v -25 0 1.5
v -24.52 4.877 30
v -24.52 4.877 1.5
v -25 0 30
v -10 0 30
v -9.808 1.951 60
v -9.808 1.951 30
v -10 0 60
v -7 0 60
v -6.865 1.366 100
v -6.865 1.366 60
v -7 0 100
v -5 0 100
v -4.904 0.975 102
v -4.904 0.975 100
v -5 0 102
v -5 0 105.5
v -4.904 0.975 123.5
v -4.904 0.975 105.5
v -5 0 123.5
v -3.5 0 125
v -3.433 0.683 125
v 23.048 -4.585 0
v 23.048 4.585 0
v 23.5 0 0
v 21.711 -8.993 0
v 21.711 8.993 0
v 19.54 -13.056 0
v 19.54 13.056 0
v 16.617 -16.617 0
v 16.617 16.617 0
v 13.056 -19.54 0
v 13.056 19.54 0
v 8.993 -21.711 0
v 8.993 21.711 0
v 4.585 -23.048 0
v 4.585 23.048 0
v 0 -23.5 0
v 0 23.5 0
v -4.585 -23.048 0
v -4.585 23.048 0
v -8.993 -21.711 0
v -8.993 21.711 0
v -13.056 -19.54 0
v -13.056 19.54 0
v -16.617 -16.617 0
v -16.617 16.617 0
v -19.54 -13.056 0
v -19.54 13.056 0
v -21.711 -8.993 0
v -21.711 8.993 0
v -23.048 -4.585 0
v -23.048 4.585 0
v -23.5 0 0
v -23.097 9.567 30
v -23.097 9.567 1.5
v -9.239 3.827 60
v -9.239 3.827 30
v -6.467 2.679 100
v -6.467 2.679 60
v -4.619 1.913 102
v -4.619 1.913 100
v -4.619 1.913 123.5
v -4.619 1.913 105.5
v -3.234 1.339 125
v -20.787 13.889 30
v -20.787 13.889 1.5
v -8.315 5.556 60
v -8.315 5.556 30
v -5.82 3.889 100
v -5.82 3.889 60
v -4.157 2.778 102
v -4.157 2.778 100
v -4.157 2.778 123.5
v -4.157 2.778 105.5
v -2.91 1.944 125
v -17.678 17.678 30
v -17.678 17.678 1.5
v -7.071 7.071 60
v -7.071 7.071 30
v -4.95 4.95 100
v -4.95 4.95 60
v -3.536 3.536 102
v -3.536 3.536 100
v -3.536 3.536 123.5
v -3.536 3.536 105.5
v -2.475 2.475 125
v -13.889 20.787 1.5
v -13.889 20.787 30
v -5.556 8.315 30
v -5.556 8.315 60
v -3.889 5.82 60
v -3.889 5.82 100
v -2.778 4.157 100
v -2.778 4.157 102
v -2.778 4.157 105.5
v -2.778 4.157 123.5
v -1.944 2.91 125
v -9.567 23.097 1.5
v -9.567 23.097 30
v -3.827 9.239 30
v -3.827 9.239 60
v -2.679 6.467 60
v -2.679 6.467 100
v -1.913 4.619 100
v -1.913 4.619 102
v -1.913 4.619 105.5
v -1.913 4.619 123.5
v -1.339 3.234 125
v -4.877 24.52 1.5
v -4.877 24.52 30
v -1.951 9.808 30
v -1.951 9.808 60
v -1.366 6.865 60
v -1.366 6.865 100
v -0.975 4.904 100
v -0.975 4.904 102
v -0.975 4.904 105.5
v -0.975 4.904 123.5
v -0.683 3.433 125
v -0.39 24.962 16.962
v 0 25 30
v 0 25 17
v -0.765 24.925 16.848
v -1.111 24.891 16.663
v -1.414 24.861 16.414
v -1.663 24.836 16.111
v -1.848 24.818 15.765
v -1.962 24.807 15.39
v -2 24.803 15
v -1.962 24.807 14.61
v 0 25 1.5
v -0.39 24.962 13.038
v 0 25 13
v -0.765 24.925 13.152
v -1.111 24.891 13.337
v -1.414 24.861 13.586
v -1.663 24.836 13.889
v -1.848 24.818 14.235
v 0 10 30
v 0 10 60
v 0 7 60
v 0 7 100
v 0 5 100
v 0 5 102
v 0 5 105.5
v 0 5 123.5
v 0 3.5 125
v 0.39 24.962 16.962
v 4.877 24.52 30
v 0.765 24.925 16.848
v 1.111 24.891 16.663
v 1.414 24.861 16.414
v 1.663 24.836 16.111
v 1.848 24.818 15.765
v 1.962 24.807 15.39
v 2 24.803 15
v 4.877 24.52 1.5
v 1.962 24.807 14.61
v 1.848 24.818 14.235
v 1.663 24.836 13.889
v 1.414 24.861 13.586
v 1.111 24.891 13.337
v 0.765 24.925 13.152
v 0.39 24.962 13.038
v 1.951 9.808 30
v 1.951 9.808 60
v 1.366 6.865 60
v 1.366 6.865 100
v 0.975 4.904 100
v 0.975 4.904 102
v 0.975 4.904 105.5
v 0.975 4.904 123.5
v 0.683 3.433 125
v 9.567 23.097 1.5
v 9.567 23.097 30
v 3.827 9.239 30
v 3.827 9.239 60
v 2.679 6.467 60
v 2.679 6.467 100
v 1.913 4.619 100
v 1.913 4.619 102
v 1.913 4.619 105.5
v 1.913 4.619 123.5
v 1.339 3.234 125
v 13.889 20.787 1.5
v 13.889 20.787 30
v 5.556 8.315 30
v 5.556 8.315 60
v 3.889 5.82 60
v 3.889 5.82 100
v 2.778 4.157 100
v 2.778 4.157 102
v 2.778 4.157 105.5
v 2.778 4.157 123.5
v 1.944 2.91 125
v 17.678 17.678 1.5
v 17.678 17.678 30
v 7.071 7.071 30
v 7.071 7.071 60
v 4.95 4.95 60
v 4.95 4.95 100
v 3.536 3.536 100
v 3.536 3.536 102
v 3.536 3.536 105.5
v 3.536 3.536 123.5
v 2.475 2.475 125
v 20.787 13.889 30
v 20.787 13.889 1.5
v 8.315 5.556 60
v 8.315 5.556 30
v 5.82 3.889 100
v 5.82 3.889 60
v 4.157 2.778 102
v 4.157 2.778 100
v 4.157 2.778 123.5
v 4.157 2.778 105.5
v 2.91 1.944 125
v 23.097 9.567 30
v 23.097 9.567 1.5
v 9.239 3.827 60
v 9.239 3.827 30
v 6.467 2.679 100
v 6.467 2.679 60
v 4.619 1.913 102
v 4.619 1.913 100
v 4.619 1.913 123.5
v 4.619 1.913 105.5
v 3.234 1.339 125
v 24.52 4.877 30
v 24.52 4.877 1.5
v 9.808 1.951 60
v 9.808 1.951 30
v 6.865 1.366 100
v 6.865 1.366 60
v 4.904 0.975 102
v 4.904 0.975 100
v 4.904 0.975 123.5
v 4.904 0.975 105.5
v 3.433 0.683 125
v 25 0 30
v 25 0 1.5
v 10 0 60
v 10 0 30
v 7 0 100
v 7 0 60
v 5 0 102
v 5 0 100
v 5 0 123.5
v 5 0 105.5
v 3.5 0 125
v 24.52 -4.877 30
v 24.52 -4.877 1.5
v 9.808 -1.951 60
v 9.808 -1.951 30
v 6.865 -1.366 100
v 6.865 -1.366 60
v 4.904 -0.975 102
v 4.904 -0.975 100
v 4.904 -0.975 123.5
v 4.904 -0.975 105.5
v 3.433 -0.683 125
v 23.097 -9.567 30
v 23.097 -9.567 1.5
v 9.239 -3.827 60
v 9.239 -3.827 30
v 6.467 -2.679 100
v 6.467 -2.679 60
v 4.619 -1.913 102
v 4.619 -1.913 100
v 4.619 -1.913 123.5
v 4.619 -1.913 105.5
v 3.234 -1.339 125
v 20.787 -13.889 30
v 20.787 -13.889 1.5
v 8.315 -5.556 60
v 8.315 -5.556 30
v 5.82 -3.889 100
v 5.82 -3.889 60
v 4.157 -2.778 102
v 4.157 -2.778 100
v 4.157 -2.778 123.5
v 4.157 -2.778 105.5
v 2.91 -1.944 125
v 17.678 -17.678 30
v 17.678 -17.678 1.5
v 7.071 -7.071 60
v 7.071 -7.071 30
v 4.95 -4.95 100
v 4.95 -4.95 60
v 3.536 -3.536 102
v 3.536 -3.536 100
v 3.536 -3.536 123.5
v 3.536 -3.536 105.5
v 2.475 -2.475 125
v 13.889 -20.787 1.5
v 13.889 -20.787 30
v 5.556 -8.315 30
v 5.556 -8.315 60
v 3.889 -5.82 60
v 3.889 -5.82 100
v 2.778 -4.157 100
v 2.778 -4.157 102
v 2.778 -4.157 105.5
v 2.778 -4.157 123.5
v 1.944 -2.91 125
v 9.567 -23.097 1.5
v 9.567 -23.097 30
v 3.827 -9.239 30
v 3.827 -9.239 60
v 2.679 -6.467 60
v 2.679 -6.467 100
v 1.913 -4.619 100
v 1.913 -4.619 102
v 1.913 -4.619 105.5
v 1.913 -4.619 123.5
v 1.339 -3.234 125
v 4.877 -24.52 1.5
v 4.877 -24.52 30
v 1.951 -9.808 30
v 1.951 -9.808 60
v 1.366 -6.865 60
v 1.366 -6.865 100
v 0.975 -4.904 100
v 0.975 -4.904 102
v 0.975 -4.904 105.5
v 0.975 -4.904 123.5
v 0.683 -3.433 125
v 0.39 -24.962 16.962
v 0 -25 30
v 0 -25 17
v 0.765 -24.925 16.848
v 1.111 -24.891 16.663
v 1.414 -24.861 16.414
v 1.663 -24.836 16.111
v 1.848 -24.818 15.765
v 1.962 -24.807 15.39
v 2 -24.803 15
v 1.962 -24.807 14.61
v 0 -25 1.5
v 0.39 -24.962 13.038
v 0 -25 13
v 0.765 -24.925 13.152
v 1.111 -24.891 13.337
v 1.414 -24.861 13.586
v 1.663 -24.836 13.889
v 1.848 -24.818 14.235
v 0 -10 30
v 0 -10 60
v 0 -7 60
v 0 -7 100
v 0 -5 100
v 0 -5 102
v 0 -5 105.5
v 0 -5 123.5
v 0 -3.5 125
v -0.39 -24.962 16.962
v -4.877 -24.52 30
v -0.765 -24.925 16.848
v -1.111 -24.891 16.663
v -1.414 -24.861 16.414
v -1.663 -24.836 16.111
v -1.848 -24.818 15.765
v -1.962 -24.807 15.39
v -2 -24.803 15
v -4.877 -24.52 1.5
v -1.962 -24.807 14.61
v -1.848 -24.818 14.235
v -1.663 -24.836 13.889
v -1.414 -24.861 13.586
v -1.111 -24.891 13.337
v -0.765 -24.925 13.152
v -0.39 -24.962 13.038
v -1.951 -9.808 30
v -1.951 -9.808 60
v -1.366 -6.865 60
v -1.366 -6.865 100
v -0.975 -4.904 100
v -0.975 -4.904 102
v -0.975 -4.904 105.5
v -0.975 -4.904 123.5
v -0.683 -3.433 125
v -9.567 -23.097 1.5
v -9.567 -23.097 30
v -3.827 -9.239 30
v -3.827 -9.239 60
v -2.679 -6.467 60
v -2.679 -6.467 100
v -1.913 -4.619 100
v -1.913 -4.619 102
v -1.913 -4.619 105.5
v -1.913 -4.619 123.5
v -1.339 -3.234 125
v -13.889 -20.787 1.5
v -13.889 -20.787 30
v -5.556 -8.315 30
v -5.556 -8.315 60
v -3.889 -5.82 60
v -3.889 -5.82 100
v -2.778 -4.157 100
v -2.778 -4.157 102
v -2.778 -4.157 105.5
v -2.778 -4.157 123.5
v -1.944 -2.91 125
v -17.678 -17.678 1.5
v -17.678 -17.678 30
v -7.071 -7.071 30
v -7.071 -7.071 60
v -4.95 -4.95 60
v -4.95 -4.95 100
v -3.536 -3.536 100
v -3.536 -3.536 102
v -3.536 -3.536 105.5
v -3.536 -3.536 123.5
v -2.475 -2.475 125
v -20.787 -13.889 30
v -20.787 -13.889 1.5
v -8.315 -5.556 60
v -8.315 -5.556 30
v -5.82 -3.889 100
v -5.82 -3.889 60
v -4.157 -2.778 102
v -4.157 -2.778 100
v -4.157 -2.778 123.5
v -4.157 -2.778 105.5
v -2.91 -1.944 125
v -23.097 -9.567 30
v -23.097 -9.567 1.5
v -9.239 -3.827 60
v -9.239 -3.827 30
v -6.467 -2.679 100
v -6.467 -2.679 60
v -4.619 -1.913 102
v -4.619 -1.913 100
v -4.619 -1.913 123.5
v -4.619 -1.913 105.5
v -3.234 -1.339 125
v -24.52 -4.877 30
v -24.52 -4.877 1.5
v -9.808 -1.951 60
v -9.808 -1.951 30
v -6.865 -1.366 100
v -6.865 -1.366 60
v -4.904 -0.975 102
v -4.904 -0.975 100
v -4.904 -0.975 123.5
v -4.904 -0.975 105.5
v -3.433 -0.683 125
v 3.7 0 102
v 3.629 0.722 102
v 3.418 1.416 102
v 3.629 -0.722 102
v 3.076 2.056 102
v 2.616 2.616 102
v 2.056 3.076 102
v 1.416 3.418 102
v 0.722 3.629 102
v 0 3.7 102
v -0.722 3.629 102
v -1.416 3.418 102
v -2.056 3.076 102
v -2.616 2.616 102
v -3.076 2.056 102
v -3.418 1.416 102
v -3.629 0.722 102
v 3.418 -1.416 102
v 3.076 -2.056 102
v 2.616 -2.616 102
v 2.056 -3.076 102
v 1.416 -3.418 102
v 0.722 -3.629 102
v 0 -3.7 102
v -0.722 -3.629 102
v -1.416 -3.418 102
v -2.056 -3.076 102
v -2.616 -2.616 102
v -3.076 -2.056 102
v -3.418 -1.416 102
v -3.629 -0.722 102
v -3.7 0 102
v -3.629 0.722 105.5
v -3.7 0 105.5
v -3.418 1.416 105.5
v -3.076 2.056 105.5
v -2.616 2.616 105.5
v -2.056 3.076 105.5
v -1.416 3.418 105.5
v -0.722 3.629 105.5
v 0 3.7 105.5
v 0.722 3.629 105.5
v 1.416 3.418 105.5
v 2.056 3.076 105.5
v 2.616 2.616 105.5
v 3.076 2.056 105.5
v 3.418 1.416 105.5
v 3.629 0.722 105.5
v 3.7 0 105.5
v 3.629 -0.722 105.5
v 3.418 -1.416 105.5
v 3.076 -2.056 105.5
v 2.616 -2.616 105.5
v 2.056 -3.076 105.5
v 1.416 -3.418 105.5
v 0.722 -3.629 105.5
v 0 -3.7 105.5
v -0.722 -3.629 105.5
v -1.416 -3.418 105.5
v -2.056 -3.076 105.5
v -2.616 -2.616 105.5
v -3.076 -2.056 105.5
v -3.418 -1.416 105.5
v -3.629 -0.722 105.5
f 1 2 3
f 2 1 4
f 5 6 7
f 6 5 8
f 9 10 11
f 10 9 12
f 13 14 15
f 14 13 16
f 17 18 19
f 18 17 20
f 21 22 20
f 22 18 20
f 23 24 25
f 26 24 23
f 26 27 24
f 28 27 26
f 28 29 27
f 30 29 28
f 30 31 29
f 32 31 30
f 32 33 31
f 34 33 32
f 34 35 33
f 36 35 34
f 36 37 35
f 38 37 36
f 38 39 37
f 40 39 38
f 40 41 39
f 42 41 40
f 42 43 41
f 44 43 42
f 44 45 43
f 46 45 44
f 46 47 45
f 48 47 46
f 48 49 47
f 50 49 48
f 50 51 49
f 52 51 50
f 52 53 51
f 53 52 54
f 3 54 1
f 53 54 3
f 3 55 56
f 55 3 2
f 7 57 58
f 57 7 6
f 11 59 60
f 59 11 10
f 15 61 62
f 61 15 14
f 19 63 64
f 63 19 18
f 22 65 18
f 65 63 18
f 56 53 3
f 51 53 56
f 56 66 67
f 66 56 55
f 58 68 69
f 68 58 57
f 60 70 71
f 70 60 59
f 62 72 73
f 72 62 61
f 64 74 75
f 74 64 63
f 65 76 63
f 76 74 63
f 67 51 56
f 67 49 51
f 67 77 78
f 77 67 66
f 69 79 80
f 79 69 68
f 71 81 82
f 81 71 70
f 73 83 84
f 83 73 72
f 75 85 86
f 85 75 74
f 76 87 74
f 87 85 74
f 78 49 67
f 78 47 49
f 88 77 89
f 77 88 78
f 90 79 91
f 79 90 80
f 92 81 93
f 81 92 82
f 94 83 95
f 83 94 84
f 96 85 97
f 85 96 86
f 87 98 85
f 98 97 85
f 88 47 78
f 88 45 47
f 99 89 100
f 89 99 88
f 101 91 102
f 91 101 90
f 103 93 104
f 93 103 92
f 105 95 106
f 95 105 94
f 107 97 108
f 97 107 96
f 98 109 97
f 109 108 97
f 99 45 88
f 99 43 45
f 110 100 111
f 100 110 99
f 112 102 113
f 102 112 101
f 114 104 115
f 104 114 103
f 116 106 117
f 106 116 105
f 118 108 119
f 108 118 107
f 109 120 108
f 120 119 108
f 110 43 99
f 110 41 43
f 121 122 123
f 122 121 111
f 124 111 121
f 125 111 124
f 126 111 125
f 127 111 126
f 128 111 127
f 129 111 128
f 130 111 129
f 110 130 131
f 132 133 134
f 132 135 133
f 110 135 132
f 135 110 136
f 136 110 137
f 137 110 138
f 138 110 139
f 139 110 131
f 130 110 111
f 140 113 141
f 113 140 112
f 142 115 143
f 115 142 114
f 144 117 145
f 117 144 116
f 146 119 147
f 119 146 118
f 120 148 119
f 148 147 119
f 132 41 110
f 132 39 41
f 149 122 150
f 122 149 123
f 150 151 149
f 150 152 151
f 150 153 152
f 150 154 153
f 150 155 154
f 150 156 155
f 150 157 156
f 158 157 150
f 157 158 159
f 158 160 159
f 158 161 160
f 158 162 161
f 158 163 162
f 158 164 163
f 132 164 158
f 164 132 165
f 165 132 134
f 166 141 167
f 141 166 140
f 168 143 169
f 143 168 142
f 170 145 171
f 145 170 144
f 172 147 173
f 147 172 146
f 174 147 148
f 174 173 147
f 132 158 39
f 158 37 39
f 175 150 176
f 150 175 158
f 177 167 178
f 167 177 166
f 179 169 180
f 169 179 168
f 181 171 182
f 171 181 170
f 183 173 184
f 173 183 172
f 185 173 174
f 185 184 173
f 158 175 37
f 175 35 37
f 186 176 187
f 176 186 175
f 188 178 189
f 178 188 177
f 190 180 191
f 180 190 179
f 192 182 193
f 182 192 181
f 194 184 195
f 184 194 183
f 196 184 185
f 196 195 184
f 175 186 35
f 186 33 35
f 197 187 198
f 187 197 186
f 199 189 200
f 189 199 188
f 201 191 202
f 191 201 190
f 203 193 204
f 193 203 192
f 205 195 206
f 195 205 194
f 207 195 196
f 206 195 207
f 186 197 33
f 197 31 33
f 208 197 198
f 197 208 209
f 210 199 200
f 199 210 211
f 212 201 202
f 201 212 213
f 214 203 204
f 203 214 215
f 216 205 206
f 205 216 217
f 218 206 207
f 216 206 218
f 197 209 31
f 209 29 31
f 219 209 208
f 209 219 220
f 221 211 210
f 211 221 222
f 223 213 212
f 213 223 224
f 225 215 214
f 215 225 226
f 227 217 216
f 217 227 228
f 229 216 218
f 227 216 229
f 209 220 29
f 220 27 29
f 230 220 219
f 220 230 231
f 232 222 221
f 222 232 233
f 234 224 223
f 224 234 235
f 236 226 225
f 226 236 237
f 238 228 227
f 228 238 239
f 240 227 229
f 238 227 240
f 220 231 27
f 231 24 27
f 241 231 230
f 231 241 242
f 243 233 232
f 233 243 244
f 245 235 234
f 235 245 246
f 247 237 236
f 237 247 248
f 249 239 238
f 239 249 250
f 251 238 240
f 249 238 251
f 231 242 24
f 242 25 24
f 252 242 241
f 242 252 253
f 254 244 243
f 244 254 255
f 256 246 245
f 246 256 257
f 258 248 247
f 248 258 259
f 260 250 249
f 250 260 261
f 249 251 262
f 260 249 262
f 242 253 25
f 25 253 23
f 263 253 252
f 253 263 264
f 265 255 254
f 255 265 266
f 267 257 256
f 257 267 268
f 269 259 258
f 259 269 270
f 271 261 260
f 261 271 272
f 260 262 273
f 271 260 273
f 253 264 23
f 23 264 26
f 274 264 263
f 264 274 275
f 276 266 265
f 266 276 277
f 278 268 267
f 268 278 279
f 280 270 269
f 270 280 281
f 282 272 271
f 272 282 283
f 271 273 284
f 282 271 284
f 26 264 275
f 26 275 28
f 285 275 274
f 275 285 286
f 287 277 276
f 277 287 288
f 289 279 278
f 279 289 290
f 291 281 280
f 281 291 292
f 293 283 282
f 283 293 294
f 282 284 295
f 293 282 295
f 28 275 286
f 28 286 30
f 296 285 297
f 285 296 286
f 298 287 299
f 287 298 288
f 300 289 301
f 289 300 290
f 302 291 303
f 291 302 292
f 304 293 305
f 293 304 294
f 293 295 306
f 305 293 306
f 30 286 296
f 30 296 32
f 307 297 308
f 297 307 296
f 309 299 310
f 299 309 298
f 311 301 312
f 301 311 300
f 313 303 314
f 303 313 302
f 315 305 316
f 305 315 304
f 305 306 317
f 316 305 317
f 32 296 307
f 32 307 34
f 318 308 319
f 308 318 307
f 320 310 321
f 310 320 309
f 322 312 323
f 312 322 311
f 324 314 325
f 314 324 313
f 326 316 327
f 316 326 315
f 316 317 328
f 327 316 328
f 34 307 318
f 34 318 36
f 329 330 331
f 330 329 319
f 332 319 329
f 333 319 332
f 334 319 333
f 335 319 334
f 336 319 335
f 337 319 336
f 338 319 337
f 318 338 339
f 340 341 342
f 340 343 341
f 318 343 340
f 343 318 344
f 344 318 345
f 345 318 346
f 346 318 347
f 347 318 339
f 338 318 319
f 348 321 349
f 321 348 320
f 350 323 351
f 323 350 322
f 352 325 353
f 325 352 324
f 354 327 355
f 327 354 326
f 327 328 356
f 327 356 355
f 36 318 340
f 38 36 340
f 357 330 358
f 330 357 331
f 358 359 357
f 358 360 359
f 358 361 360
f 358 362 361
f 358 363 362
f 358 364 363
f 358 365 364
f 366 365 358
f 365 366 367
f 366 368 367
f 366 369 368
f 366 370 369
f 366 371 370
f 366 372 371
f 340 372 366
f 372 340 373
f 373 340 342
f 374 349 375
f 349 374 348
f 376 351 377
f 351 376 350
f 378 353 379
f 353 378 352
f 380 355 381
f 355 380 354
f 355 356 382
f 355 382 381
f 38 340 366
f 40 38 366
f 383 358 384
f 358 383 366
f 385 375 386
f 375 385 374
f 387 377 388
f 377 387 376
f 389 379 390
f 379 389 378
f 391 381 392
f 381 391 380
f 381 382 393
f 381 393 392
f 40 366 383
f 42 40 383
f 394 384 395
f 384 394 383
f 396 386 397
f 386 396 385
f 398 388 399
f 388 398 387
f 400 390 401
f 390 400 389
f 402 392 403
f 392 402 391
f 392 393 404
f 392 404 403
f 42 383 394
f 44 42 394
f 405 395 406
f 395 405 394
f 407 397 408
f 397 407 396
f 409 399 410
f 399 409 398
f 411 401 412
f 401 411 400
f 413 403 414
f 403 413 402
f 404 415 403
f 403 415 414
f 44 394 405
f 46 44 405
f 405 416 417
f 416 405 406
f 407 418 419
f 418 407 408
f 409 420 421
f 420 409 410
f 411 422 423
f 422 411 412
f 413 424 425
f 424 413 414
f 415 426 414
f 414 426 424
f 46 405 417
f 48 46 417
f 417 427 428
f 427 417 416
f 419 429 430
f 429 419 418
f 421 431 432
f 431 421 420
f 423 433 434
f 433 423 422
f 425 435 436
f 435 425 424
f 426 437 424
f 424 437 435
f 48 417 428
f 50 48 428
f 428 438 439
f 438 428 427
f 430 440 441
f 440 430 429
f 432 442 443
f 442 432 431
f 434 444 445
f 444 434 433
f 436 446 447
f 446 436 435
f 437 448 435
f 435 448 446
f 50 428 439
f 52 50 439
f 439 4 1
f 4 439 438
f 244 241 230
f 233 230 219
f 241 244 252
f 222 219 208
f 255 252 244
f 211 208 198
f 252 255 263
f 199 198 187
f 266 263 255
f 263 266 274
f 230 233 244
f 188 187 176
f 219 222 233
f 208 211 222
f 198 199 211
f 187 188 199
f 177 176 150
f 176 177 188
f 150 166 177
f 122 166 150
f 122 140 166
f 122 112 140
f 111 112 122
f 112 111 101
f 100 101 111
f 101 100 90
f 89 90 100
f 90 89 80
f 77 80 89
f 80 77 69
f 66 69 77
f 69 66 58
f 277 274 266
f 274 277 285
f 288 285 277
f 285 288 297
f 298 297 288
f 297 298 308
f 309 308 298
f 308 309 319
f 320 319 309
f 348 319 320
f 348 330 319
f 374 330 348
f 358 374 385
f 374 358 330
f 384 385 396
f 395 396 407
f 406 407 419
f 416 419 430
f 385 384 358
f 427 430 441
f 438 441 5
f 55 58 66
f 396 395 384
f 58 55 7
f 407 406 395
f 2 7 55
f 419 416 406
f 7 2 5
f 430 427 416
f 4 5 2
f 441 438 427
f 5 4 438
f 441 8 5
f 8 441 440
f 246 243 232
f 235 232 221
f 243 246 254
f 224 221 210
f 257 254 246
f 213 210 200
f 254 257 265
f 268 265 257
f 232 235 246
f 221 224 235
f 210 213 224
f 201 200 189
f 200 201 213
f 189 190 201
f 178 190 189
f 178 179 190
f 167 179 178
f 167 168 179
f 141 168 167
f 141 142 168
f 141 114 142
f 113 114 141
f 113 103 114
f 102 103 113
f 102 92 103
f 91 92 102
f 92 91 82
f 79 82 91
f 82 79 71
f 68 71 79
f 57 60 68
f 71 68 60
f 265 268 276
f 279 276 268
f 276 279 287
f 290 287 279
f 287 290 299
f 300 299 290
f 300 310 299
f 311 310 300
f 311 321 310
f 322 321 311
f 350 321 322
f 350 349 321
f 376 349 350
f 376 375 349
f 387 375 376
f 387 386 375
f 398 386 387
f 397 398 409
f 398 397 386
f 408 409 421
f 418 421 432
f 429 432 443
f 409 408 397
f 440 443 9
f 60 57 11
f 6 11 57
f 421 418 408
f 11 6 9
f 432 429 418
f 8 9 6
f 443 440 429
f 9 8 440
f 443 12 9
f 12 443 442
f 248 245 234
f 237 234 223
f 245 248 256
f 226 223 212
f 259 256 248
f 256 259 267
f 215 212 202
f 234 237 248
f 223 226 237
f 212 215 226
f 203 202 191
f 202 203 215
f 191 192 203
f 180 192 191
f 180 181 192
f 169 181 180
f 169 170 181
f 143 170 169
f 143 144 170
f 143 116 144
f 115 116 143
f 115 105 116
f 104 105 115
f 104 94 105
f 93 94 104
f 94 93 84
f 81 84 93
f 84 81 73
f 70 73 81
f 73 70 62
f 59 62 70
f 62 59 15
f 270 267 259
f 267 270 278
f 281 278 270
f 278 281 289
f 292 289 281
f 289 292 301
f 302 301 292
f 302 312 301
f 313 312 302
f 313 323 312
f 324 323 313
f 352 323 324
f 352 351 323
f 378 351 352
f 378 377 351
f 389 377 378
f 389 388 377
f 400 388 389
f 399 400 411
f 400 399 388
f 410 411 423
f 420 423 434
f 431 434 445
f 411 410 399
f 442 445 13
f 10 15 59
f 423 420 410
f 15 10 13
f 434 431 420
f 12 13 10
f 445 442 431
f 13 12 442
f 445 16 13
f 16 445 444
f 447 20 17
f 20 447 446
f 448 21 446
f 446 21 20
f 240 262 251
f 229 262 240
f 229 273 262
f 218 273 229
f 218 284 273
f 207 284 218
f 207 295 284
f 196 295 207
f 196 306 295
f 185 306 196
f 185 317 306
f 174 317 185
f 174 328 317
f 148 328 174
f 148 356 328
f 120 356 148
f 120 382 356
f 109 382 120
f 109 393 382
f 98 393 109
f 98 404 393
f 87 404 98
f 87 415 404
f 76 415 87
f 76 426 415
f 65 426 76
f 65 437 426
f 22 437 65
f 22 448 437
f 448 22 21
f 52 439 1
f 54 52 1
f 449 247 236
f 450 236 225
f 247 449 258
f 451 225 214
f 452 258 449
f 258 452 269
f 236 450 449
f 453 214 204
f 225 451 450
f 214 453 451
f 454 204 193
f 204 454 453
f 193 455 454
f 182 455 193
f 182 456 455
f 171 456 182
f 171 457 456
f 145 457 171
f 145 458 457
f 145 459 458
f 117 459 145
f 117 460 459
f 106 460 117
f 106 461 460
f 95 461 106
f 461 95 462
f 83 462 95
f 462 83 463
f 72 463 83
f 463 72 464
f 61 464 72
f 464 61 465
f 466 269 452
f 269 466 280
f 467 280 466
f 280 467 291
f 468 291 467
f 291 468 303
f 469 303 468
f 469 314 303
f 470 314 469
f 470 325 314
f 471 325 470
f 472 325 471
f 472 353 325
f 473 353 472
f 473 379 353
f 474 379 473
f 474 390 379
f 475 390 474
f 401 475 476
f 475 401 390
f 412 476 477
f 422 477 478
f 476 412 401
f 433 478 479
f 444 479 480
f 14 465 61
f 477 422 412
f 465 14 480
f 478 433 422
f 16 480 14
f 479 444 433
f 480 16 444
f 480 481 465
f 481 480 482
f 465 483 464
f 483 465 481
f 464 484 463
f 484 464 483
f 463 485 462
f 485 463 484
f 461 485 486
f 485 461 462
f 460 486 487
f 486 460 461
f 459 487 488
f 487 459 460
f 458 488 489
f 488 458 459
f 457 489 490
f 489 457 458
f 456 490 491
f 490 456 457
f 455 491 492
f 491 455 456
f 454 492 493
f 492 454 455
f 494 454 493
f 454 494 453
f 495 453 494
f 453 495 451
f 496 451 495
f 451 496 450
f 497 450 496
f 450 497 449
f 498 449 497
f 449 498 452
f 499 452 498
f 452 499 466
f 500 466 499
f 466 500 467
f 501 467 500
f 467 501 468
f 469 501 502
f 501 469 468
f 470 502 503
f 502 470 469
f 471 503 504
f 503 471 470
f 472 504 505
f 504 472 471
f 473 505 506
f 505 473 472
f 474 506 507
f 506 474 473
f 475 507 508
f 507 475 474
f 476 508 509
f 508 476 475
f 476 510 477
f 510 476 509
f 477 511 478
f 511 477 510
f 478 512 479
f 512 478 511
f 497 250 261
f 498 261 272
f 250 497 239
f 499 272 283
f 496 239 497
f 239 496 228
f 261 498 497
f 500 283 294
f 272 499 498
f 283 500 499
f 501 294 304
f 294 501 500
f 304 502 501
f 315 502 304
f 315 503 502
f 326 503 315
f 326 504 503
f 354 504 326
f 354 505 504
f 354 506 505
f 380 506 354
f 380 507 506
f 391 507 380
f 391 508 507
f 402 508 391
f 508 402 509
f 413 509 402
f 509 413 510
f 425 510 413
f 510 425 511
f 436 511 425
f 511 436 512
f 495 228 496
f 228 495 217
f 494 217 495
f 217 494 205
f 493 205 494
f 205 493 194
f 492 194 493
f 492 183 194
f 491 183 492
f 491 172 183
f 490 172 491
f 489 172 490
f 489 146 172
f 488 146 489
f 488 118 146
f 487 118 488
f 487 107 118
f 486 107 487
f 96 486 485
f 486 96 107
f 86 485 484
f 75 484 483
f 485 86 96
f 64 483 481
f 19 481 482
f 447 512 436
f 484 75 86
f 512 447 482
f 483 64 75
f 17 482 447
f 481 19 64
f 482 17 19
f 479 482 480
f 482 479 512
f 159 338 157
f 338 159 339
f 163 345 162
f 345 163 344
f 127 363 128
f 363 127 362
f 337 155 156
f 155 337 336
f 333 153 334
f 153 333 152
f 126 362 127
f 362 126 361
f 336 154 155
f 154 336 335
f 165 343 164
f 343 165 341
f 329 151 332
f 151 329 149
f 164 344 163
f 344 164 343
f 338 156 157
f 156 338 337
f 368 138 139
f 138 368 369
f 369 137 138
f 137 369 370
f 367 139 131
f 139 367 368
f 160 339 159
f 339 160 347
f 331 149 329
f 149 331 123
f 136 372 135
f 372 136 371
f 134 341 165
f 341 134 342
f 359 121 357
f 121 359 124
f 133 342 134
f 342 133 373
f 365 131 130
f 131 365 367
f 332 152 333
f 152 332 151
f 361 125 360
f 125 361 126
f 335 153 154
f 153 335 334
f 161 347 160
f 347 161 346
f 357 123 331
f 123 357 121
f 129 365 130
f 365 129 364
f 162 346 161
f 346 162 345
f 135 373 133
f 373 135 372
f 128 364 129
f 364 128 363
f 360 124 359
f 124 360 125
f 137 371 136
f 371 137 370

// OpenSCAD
$fn = 32;

// ----------------------------------------------------------------------
// Stepped shaft: diameters 50, 20, 14, 10 mm, 125 mm long
// ----------------------------------------------------------------------

// --- parameters (mm) ---
d1 = 50;                  // step 1 diameter
len1 = 30;                // step 1 length
d2 = 20;                  // step 2 diameter
len2 = 30;                // step 2 length
d3 = 14;                  // step 3 diameter
len3 = 40;                // step 3 length
d4 = 10;                  // step 4 diameter
len4 = 25;                // step 4 length
total = 125;              // overall length
chamfer = 1.5;            // end chamfer
groove_r = 5;             // groove radius
groove_z = 102;           // groove position from the end
groove_w = 3.5;           // groove width
groove_d = 1.3;           // groove depth
cross_d = 4;              // cross pin hole
cross_z = 15;             // cross hole position

/* closed turning profile: x is the radius, y is the length */
profile = [[0, 0], [25 - chamfer, 0], [25, chamfer], [25, 30], [10, 30], [10, 60], [7, 60], [7, 100], [5, 100], [5, 123.5], [3.5, 125], [0, 125]];

difference() {
  rotate_extrude() polygon(profile);
  /* circlip groove just behind the shoulder */
  rotate_extrude() translate([groove_r - groove_d, groove_z]) square([groove_d + 1, groove_w]);
  /* cross pin hole through the small step */
  translate([0, 0, cross_z]) rotate([90, 0, 0]) cylinder(h = d1 + 4, d = cross_d, center = true);
}
